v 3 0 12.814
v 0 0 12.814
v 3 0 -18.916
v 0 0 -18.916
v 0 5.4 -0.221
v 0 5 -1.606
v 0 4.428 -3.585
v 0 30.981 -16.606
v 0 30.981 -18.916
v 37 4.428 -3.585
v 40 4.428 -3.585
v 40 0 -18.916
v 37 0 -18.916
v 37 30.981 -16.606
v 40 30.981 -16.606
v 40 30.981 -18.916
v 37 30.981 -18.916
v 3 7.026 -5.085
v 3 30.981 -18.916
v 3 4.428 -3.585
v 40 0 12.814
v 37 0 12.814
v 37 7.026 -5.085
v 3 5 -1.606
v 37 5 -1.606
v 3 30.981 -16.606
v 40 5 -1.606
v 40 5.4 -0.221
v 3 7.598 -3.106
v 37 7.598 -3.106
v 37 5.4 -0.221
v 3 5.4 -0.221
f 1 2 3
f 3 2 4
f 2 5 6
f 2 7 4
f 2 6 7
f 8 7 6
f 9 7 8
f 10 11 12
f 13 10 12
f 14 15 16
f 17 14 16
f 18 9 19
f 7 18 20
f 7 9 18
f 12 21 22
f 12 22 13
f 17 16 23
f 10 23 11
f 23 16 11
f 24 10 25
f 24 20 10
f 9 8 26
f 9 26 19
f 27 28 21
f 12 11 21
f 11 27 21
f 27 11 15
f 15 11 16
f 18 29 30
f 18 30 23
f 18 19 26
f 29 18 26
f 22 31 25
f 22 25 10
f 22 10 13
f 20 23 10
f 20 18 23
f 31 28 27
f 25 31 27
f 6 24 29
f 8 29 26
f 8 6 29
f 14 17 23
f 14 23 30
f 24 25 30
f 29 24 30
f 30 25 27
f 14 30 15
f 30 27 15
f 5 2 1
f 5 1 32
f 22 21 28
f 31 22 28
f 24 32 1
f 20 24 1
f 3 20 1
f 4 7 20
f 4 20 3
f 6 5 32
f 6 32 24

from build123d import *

# Parameters (mm, degrees)
BOSS_EXTRUDE1_DEPTH = 3
BOSS_EXTRUDE3_DEPTH = 17


with BuildPart() as part:
    # Sketch1 → Boss-Extrude1 (new body)
    with BuildSketch(Plane(origin=(0, 0, 0), x_dir=(0, 0, -1), z_dir=(1, 0, 0))):
        Polygon((0, 0), (-12.814351741, 0), (0.221356727, 5.4), (1.606108813, 5), (16.606108813, 30.980762114), (18.91550989, 30.980762114), (3.585414012, 4.428257168), (18.91550989, 0), align=None)
    boss_extrude1 = extrude(amount=BOSS_EXTRUDE1_DEPTH)

    # Sketch3 → Boss-Extrude3 (add)
    with BuildSketch(Plane(origin=(20, 0, 0), x_dir=(0, 0, -1), z_dir=(1, 0, 0))):
        Polygon((3.585414012, 4.428257168), (1.606108813, 5), (3.106108813, 7.598076211), (5.085414012, 7.026333379), align=None)
    boss_extrude3 = extrude(amount=-BOSS_EXTRUDE3_DEPTH)

    # Mirror5: Boss-Extrude3 across plane
    add(boss_extrude3.mirror(Plane(origin=(20, 0, 0), x_dir=(0, 0, 1), z_dir=(1, 0, 0))))

    # Mirror6: Boss-Extrude1 across plane
    add(boss_extrude1.mirror(Plane(origin=(20, 0, 0), x_dir=(0, 0, 1), z_dir=(1, 0, 0))))


solid = part.part
